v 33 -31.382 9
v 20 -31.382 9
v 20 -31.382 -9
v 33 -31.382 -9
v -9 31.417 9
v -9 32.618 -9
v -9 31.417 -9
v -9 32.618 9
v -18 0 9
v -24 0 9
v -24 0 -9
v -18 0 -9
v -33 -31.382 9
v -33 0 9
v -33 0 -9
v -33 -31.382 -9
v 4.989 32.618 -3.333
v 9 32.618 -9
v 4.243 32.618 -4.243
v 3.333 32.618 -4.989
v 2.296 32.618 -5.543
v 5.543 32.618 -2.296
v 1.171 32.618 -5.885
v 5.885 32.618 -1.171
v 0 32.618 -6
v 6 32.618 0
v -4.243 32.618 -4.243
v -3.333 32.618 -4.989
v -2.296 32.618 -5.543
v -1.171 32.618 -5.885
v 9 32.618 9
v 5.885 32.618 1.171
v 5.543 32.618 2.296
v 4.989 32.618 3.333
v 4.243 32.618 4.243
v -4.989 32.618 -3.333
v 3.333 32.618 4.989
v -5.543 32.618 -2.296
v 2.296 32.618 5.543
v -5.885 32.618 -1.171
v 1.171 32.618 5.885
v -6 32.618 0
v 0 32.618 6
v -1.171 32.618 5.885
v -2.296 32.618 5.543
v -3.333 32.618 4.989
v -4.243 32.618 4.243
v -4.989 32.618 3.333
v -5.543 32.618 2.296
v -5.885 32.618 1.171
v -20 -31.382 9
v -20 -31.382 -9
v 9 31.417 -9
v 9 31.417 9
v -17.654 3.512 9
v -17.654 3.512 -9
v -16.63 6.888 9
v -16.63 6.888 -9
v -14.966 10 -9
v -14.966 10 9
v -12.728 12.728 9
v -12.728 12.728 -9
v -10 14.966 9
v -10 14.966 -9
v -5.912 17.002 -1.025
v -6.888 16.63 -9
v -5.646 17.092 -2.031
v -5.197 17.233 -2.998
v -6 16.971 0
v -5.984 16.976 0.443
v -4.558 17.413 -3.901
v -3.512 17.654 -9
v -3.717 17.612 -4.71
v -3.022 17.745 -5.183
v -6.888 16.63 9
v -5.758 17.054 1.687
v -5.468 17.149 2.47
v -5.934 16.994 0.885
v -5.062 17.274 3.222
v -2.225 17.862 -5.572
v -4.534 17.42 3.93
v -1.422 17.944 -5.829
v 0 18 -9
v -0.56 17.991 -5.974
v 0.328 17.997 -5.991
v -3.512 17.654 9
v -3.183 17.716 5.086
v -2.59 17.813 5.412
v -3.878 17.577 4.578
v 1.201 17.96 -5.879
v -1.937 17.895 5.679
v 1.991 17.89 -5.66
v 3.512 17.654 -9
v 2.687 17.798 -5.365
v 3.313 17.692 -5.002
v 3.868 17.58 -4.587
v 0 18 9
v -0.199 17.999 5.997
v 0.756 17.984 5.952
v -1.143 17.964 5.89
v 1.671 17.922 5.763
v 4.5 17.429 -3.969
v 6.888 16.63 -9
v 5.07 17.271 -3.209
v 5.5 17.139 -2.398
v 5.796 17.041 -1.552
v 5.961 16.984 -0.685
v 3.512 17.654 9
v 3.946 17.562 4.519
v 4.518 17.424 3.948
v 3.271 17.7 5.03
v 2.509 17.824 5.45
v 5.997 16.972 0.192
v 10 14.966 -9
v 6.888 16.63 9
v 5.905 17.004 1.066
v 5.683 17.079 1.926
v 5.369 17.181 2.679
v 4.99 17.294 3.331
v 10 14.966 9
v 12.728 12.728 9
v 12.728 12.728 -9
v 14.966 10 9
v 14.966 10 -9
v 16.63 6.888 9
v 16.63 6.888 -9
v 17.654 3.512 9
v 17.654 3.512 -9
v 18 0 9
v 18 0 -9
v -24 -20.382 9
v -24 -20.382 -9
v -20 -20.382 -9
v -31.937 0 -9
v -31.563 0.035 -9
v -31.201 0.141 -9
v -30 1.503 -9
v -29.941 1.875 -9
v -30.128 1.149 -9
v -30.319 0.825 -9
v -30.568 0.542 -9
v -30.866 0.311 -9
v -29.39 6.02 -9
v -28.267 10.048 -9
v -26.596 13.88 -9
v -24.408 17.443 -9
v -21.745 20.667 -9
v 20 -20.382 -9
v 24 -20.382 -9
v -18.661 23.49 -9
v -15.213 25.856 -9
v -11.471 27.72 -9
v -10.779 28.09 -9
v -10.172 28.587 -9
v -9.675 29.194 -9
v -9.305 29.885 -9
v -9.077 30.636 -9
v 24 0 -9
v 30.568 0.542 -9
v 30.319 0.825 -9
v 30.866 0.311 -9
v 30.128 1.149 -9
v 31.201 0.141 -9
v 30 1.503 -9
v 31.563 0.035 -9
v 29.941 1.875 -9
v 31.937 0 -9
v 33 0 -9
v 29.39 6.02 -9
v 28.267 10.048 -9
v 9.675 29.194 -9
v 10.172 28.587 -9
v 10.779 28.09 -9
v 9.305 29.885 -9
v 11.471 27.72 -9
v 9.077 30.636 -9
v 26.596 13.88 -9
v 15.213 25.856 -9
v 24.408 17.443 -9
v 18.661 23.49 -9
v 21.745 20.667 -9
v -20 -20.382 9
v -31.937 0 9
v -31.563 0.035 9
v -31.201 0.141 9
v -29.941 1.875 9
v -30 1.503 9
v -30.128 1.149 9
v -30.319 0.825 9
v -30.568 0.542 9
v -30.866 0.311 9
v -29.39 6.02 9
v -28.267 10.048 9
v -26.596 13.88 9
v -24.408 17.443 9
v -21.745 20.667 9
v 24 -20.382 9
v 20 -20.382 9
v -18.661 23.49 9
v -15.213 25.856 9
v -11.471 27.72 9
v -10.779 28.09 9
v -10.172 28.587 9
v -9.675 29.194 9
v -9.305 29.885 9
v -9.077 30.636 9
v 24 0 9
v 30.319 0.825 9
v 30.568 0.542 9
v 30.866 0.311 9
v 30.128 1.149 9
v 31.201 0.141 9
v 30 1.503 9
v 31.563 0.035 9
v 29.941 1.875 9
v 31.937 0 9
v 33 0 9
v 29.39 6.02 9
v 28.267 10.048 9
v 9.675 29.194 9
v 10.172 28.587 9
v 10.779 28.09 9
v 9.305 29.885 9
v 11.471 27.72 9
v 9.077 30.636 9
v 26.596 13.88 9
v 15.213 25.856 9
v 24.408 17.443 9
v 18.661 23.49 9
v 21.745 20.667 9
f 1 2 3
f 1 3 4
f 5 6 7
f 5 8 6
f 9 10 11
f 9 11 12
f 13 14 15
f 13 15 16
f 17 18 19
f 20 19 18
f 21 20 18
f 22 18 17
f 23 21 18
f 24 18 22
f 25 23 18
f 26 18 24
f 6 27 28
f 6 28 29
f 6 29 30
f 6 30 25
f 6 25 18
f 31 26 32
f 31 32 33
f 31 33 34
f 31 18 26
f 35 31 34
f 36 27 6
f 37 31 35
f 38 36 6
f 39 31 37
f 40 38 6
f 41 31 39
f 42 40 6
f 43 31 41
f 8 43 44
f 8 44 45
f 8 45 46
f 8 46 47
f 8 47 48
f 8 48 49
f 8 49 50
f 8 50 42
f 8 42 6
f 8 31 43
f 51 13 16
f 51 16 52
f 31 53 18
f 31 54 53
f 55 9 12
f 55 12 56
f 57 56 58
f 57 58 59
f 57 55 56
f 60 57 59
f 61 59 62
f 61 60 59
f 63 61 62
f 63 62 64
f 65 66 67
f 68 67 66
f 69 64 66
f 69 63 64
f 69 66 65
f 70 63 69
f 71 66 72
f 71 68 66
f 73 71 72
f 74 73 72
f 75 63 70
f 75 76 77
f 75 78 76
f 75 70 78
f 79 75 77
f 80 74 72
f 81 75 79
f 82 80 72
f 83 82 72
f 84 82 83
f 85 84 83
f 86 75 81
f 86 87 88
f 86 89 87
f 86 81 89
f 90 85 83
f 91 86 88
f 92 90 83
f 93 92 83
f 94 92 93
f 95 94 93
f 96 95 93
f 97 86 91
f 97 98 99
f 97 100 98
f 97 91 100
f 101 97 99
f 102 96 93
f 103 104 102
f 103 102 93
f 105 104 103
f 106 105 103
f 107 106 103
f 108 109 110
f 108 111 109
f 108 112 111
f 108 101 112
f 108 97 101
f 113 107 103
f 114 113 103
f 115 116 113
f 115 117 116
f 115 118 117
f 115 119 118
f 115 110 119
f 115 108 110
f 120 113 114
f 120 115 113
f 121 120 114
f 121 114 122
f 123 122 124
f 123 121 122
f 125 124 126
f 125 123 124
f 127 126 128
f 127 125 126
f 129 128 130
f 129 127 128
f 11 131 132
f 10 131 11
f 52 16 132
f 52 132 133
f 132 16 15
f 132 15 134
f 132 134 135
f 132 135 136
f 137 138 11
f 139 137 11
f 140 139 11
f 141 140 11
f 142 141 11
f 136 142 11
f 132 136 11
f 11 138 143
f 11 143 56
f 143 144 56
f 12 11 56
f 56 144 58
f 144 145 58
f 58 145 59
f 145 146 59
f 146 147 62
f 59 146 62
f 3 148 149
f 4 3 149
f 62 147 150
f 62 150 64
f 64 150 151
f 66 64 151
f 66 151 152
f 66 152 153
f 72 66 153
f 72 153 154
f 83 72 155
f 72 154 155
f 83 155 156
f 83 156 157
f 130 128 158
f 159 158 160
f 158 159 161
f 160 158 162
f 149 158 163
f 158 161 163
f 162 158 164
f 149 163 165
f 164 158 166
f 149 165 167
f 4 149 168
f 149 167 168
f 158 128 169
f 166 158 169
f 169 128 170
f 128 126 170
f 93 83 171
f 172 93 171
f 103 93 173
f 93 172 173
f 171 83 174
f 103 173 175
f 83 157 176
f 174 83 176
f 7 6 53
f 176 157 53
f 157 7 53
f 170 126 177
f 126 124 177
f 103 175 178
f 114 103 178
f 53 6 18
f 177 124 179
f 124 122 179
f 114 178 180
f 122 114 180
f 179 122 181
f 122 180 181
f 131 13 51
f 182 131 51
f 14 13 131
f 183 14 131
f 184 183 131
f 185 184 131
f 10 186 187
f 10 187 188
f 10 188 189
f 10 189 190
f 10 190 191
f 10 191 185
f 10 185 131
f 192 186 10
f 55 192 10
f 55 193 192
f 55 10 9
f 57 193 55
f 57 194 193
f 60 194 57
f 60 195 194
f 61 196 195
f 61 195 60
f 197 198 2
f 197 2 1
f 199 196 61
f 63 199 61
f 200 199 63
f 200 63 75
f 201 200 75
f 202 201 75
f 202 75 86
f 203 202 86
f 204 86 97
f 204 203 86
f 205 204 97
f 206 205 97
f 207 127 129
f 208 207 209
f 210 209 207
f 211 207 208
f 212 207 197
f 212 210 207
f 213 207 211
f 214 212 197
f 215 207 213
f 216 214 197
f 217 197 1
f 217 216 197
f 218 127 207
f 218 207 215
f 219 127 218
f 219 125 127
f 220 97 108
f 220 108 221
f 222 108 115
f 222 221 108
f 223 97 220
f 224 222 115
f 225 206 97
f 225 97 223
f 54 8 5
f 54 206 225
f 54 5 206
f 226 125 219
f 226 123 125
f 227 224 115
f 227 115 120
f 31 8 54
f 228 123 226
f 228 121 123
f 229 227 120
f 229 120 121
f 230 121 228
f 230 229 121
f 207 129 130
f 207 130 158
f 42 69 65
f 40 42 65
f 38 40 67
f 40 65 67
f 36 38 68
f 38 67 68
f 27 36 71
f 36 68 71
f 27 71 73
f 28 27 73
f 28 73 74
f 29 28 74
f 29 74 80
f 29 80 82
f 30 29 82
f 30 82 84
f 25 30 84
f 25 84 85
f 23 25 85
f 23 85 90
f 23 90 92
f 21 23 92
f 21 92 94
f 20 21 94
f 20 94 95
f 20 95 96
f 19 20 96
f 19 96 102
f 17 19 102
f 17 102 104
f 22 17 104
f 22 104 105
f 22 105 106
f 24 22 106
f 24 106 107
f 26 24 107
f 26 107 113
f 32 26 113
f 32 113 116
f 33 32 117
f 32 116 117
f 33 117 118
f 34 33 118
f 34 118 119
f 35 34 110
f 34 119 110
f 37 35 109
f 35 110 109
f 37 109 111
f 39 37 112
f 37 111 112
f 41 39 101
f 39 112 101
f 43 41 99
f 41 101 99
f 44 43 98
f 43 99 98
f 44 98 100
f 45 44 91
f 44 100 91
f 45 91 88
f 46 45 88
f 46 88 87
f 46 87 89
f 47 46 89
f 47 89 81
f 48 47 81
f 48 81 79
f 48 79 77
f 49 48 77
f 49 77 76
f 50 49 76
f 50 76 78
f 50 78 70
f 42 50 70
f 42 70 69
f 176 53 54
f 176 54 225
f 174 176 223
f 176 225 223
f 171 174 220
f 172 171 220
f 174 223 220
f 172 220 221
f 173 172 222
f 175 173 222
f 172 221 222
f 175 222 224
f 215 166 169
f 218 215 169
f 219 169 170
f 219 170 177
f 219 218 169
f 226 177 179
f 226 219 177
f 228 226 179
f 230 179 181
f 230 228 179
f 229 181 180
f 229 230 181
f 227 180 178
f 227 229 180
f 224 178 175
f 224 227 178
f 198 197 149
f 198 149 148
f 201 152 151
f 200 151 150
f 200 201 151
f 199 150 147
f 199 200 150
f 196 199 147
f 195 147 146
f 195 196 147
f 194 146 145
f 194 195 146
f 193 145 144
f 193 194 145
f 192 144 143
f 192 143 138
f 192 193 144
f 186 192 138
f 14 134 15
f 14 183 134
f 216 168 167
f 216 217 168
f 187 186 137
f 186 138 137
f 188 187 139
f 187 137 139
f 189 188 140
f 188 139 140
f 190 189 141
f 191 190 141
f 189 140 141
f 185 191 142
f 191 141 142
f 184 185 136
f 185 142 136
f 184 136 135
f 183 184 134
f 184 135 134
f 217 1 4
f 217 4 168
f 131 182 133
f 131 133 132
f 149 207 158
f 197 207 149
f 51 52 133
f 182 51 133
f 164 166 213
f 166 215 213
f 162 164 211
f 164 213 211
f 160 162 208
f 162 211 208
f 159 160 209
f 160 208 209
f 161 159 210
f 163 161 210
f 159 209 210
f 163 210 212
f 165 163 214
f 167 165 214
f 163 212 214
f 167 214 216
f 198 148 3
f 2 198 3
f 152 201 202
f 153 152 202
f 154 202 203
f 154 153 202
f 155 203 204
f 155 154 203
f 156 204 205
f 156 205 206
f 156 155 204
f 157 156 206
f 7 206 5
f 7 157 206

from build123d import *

# Parameters (mm, degrees)
BOSS_EXTRUDE1_DEPTH = 9
FILLET1_R           = 4
FILLET2_R           = 2
HOLE1_D             = 12


with BuildPart() as part:
    # Sketch1 → Boss-Extrude1 (new, symmetric)
    with BuildSketch(Plane.XY):
        with BuildLine():
            Line((-30, 0), (-33, 0))
            Line((-33, 0), (-33, -31.381823957))
            Line((-33, -31.381823957), (-20, -31.381823957))
            Line((-20, -31.381823957), (-20, -20.381823957))
            Line((-20, -20.381823957), (-24, -20.381823957))
            Line((-24, -20.381823957), (-24, 0))
            Line((-24, 0), (-18, 0))
            ThreePointArc((-18, 0), (0, 18), (18, 0))
            Line((18, 0), (24, 0))
            Line((24, 0), (24, -20.381823957))
            Line((24, -20.381823957), (20, -20.381823957))
            Line((20, -20.381823957), (20, -31.381823957))
            Line((20, -31.381823957), (33, -31.381823957))
            Line((33, -31.381823957), (33, 0))
            Line((33, 0), (30, 0))
            ThreePointArc((30, 0), (24.186773245, 17.748239349), (9, 28.618176043))
            Line((9, 28.618176043), (9, 32.618176043))
            Line((9, 32.618176043), (-9, 32.618176043))
            Line((-9, 32.618176043), (-9, 28.618176043))
            ThreePointArc((-9, 28.618176043), (-24.186773245, 17.748239349), (-30, 0))
        make_face()
    extrude(amount=BOSS_EXTRUDE1_DEPTH, both=True)

    # Fillet1
    fillet1_edges = [part.edges().sort_by_distance(p)[0] for p in [
        (-9, 28.618176043, 0),
        (9, 28.618176043, 0),
    ]]
    fillet(fillet1_edges, radius=FILLET1_R)

    # Fillet2
    fillet2_edges = [part.edges().sort_by_distance(p)[0] for p in [
        (30, 0, 0),
        (-30, 0, 0),
    ]]
    fillet(fillet2_edges, radius=FILLET2_R)

    # Hole1 (through all)
    with Locations(Plane(origin=(0, 32.618176043, 0), x_dir=(1, 0, 0), z_dir=(0, 1, 0))):
        with Locations((0, 0)):
            Hole(HOLE1_D / 2)


solid = part.part
